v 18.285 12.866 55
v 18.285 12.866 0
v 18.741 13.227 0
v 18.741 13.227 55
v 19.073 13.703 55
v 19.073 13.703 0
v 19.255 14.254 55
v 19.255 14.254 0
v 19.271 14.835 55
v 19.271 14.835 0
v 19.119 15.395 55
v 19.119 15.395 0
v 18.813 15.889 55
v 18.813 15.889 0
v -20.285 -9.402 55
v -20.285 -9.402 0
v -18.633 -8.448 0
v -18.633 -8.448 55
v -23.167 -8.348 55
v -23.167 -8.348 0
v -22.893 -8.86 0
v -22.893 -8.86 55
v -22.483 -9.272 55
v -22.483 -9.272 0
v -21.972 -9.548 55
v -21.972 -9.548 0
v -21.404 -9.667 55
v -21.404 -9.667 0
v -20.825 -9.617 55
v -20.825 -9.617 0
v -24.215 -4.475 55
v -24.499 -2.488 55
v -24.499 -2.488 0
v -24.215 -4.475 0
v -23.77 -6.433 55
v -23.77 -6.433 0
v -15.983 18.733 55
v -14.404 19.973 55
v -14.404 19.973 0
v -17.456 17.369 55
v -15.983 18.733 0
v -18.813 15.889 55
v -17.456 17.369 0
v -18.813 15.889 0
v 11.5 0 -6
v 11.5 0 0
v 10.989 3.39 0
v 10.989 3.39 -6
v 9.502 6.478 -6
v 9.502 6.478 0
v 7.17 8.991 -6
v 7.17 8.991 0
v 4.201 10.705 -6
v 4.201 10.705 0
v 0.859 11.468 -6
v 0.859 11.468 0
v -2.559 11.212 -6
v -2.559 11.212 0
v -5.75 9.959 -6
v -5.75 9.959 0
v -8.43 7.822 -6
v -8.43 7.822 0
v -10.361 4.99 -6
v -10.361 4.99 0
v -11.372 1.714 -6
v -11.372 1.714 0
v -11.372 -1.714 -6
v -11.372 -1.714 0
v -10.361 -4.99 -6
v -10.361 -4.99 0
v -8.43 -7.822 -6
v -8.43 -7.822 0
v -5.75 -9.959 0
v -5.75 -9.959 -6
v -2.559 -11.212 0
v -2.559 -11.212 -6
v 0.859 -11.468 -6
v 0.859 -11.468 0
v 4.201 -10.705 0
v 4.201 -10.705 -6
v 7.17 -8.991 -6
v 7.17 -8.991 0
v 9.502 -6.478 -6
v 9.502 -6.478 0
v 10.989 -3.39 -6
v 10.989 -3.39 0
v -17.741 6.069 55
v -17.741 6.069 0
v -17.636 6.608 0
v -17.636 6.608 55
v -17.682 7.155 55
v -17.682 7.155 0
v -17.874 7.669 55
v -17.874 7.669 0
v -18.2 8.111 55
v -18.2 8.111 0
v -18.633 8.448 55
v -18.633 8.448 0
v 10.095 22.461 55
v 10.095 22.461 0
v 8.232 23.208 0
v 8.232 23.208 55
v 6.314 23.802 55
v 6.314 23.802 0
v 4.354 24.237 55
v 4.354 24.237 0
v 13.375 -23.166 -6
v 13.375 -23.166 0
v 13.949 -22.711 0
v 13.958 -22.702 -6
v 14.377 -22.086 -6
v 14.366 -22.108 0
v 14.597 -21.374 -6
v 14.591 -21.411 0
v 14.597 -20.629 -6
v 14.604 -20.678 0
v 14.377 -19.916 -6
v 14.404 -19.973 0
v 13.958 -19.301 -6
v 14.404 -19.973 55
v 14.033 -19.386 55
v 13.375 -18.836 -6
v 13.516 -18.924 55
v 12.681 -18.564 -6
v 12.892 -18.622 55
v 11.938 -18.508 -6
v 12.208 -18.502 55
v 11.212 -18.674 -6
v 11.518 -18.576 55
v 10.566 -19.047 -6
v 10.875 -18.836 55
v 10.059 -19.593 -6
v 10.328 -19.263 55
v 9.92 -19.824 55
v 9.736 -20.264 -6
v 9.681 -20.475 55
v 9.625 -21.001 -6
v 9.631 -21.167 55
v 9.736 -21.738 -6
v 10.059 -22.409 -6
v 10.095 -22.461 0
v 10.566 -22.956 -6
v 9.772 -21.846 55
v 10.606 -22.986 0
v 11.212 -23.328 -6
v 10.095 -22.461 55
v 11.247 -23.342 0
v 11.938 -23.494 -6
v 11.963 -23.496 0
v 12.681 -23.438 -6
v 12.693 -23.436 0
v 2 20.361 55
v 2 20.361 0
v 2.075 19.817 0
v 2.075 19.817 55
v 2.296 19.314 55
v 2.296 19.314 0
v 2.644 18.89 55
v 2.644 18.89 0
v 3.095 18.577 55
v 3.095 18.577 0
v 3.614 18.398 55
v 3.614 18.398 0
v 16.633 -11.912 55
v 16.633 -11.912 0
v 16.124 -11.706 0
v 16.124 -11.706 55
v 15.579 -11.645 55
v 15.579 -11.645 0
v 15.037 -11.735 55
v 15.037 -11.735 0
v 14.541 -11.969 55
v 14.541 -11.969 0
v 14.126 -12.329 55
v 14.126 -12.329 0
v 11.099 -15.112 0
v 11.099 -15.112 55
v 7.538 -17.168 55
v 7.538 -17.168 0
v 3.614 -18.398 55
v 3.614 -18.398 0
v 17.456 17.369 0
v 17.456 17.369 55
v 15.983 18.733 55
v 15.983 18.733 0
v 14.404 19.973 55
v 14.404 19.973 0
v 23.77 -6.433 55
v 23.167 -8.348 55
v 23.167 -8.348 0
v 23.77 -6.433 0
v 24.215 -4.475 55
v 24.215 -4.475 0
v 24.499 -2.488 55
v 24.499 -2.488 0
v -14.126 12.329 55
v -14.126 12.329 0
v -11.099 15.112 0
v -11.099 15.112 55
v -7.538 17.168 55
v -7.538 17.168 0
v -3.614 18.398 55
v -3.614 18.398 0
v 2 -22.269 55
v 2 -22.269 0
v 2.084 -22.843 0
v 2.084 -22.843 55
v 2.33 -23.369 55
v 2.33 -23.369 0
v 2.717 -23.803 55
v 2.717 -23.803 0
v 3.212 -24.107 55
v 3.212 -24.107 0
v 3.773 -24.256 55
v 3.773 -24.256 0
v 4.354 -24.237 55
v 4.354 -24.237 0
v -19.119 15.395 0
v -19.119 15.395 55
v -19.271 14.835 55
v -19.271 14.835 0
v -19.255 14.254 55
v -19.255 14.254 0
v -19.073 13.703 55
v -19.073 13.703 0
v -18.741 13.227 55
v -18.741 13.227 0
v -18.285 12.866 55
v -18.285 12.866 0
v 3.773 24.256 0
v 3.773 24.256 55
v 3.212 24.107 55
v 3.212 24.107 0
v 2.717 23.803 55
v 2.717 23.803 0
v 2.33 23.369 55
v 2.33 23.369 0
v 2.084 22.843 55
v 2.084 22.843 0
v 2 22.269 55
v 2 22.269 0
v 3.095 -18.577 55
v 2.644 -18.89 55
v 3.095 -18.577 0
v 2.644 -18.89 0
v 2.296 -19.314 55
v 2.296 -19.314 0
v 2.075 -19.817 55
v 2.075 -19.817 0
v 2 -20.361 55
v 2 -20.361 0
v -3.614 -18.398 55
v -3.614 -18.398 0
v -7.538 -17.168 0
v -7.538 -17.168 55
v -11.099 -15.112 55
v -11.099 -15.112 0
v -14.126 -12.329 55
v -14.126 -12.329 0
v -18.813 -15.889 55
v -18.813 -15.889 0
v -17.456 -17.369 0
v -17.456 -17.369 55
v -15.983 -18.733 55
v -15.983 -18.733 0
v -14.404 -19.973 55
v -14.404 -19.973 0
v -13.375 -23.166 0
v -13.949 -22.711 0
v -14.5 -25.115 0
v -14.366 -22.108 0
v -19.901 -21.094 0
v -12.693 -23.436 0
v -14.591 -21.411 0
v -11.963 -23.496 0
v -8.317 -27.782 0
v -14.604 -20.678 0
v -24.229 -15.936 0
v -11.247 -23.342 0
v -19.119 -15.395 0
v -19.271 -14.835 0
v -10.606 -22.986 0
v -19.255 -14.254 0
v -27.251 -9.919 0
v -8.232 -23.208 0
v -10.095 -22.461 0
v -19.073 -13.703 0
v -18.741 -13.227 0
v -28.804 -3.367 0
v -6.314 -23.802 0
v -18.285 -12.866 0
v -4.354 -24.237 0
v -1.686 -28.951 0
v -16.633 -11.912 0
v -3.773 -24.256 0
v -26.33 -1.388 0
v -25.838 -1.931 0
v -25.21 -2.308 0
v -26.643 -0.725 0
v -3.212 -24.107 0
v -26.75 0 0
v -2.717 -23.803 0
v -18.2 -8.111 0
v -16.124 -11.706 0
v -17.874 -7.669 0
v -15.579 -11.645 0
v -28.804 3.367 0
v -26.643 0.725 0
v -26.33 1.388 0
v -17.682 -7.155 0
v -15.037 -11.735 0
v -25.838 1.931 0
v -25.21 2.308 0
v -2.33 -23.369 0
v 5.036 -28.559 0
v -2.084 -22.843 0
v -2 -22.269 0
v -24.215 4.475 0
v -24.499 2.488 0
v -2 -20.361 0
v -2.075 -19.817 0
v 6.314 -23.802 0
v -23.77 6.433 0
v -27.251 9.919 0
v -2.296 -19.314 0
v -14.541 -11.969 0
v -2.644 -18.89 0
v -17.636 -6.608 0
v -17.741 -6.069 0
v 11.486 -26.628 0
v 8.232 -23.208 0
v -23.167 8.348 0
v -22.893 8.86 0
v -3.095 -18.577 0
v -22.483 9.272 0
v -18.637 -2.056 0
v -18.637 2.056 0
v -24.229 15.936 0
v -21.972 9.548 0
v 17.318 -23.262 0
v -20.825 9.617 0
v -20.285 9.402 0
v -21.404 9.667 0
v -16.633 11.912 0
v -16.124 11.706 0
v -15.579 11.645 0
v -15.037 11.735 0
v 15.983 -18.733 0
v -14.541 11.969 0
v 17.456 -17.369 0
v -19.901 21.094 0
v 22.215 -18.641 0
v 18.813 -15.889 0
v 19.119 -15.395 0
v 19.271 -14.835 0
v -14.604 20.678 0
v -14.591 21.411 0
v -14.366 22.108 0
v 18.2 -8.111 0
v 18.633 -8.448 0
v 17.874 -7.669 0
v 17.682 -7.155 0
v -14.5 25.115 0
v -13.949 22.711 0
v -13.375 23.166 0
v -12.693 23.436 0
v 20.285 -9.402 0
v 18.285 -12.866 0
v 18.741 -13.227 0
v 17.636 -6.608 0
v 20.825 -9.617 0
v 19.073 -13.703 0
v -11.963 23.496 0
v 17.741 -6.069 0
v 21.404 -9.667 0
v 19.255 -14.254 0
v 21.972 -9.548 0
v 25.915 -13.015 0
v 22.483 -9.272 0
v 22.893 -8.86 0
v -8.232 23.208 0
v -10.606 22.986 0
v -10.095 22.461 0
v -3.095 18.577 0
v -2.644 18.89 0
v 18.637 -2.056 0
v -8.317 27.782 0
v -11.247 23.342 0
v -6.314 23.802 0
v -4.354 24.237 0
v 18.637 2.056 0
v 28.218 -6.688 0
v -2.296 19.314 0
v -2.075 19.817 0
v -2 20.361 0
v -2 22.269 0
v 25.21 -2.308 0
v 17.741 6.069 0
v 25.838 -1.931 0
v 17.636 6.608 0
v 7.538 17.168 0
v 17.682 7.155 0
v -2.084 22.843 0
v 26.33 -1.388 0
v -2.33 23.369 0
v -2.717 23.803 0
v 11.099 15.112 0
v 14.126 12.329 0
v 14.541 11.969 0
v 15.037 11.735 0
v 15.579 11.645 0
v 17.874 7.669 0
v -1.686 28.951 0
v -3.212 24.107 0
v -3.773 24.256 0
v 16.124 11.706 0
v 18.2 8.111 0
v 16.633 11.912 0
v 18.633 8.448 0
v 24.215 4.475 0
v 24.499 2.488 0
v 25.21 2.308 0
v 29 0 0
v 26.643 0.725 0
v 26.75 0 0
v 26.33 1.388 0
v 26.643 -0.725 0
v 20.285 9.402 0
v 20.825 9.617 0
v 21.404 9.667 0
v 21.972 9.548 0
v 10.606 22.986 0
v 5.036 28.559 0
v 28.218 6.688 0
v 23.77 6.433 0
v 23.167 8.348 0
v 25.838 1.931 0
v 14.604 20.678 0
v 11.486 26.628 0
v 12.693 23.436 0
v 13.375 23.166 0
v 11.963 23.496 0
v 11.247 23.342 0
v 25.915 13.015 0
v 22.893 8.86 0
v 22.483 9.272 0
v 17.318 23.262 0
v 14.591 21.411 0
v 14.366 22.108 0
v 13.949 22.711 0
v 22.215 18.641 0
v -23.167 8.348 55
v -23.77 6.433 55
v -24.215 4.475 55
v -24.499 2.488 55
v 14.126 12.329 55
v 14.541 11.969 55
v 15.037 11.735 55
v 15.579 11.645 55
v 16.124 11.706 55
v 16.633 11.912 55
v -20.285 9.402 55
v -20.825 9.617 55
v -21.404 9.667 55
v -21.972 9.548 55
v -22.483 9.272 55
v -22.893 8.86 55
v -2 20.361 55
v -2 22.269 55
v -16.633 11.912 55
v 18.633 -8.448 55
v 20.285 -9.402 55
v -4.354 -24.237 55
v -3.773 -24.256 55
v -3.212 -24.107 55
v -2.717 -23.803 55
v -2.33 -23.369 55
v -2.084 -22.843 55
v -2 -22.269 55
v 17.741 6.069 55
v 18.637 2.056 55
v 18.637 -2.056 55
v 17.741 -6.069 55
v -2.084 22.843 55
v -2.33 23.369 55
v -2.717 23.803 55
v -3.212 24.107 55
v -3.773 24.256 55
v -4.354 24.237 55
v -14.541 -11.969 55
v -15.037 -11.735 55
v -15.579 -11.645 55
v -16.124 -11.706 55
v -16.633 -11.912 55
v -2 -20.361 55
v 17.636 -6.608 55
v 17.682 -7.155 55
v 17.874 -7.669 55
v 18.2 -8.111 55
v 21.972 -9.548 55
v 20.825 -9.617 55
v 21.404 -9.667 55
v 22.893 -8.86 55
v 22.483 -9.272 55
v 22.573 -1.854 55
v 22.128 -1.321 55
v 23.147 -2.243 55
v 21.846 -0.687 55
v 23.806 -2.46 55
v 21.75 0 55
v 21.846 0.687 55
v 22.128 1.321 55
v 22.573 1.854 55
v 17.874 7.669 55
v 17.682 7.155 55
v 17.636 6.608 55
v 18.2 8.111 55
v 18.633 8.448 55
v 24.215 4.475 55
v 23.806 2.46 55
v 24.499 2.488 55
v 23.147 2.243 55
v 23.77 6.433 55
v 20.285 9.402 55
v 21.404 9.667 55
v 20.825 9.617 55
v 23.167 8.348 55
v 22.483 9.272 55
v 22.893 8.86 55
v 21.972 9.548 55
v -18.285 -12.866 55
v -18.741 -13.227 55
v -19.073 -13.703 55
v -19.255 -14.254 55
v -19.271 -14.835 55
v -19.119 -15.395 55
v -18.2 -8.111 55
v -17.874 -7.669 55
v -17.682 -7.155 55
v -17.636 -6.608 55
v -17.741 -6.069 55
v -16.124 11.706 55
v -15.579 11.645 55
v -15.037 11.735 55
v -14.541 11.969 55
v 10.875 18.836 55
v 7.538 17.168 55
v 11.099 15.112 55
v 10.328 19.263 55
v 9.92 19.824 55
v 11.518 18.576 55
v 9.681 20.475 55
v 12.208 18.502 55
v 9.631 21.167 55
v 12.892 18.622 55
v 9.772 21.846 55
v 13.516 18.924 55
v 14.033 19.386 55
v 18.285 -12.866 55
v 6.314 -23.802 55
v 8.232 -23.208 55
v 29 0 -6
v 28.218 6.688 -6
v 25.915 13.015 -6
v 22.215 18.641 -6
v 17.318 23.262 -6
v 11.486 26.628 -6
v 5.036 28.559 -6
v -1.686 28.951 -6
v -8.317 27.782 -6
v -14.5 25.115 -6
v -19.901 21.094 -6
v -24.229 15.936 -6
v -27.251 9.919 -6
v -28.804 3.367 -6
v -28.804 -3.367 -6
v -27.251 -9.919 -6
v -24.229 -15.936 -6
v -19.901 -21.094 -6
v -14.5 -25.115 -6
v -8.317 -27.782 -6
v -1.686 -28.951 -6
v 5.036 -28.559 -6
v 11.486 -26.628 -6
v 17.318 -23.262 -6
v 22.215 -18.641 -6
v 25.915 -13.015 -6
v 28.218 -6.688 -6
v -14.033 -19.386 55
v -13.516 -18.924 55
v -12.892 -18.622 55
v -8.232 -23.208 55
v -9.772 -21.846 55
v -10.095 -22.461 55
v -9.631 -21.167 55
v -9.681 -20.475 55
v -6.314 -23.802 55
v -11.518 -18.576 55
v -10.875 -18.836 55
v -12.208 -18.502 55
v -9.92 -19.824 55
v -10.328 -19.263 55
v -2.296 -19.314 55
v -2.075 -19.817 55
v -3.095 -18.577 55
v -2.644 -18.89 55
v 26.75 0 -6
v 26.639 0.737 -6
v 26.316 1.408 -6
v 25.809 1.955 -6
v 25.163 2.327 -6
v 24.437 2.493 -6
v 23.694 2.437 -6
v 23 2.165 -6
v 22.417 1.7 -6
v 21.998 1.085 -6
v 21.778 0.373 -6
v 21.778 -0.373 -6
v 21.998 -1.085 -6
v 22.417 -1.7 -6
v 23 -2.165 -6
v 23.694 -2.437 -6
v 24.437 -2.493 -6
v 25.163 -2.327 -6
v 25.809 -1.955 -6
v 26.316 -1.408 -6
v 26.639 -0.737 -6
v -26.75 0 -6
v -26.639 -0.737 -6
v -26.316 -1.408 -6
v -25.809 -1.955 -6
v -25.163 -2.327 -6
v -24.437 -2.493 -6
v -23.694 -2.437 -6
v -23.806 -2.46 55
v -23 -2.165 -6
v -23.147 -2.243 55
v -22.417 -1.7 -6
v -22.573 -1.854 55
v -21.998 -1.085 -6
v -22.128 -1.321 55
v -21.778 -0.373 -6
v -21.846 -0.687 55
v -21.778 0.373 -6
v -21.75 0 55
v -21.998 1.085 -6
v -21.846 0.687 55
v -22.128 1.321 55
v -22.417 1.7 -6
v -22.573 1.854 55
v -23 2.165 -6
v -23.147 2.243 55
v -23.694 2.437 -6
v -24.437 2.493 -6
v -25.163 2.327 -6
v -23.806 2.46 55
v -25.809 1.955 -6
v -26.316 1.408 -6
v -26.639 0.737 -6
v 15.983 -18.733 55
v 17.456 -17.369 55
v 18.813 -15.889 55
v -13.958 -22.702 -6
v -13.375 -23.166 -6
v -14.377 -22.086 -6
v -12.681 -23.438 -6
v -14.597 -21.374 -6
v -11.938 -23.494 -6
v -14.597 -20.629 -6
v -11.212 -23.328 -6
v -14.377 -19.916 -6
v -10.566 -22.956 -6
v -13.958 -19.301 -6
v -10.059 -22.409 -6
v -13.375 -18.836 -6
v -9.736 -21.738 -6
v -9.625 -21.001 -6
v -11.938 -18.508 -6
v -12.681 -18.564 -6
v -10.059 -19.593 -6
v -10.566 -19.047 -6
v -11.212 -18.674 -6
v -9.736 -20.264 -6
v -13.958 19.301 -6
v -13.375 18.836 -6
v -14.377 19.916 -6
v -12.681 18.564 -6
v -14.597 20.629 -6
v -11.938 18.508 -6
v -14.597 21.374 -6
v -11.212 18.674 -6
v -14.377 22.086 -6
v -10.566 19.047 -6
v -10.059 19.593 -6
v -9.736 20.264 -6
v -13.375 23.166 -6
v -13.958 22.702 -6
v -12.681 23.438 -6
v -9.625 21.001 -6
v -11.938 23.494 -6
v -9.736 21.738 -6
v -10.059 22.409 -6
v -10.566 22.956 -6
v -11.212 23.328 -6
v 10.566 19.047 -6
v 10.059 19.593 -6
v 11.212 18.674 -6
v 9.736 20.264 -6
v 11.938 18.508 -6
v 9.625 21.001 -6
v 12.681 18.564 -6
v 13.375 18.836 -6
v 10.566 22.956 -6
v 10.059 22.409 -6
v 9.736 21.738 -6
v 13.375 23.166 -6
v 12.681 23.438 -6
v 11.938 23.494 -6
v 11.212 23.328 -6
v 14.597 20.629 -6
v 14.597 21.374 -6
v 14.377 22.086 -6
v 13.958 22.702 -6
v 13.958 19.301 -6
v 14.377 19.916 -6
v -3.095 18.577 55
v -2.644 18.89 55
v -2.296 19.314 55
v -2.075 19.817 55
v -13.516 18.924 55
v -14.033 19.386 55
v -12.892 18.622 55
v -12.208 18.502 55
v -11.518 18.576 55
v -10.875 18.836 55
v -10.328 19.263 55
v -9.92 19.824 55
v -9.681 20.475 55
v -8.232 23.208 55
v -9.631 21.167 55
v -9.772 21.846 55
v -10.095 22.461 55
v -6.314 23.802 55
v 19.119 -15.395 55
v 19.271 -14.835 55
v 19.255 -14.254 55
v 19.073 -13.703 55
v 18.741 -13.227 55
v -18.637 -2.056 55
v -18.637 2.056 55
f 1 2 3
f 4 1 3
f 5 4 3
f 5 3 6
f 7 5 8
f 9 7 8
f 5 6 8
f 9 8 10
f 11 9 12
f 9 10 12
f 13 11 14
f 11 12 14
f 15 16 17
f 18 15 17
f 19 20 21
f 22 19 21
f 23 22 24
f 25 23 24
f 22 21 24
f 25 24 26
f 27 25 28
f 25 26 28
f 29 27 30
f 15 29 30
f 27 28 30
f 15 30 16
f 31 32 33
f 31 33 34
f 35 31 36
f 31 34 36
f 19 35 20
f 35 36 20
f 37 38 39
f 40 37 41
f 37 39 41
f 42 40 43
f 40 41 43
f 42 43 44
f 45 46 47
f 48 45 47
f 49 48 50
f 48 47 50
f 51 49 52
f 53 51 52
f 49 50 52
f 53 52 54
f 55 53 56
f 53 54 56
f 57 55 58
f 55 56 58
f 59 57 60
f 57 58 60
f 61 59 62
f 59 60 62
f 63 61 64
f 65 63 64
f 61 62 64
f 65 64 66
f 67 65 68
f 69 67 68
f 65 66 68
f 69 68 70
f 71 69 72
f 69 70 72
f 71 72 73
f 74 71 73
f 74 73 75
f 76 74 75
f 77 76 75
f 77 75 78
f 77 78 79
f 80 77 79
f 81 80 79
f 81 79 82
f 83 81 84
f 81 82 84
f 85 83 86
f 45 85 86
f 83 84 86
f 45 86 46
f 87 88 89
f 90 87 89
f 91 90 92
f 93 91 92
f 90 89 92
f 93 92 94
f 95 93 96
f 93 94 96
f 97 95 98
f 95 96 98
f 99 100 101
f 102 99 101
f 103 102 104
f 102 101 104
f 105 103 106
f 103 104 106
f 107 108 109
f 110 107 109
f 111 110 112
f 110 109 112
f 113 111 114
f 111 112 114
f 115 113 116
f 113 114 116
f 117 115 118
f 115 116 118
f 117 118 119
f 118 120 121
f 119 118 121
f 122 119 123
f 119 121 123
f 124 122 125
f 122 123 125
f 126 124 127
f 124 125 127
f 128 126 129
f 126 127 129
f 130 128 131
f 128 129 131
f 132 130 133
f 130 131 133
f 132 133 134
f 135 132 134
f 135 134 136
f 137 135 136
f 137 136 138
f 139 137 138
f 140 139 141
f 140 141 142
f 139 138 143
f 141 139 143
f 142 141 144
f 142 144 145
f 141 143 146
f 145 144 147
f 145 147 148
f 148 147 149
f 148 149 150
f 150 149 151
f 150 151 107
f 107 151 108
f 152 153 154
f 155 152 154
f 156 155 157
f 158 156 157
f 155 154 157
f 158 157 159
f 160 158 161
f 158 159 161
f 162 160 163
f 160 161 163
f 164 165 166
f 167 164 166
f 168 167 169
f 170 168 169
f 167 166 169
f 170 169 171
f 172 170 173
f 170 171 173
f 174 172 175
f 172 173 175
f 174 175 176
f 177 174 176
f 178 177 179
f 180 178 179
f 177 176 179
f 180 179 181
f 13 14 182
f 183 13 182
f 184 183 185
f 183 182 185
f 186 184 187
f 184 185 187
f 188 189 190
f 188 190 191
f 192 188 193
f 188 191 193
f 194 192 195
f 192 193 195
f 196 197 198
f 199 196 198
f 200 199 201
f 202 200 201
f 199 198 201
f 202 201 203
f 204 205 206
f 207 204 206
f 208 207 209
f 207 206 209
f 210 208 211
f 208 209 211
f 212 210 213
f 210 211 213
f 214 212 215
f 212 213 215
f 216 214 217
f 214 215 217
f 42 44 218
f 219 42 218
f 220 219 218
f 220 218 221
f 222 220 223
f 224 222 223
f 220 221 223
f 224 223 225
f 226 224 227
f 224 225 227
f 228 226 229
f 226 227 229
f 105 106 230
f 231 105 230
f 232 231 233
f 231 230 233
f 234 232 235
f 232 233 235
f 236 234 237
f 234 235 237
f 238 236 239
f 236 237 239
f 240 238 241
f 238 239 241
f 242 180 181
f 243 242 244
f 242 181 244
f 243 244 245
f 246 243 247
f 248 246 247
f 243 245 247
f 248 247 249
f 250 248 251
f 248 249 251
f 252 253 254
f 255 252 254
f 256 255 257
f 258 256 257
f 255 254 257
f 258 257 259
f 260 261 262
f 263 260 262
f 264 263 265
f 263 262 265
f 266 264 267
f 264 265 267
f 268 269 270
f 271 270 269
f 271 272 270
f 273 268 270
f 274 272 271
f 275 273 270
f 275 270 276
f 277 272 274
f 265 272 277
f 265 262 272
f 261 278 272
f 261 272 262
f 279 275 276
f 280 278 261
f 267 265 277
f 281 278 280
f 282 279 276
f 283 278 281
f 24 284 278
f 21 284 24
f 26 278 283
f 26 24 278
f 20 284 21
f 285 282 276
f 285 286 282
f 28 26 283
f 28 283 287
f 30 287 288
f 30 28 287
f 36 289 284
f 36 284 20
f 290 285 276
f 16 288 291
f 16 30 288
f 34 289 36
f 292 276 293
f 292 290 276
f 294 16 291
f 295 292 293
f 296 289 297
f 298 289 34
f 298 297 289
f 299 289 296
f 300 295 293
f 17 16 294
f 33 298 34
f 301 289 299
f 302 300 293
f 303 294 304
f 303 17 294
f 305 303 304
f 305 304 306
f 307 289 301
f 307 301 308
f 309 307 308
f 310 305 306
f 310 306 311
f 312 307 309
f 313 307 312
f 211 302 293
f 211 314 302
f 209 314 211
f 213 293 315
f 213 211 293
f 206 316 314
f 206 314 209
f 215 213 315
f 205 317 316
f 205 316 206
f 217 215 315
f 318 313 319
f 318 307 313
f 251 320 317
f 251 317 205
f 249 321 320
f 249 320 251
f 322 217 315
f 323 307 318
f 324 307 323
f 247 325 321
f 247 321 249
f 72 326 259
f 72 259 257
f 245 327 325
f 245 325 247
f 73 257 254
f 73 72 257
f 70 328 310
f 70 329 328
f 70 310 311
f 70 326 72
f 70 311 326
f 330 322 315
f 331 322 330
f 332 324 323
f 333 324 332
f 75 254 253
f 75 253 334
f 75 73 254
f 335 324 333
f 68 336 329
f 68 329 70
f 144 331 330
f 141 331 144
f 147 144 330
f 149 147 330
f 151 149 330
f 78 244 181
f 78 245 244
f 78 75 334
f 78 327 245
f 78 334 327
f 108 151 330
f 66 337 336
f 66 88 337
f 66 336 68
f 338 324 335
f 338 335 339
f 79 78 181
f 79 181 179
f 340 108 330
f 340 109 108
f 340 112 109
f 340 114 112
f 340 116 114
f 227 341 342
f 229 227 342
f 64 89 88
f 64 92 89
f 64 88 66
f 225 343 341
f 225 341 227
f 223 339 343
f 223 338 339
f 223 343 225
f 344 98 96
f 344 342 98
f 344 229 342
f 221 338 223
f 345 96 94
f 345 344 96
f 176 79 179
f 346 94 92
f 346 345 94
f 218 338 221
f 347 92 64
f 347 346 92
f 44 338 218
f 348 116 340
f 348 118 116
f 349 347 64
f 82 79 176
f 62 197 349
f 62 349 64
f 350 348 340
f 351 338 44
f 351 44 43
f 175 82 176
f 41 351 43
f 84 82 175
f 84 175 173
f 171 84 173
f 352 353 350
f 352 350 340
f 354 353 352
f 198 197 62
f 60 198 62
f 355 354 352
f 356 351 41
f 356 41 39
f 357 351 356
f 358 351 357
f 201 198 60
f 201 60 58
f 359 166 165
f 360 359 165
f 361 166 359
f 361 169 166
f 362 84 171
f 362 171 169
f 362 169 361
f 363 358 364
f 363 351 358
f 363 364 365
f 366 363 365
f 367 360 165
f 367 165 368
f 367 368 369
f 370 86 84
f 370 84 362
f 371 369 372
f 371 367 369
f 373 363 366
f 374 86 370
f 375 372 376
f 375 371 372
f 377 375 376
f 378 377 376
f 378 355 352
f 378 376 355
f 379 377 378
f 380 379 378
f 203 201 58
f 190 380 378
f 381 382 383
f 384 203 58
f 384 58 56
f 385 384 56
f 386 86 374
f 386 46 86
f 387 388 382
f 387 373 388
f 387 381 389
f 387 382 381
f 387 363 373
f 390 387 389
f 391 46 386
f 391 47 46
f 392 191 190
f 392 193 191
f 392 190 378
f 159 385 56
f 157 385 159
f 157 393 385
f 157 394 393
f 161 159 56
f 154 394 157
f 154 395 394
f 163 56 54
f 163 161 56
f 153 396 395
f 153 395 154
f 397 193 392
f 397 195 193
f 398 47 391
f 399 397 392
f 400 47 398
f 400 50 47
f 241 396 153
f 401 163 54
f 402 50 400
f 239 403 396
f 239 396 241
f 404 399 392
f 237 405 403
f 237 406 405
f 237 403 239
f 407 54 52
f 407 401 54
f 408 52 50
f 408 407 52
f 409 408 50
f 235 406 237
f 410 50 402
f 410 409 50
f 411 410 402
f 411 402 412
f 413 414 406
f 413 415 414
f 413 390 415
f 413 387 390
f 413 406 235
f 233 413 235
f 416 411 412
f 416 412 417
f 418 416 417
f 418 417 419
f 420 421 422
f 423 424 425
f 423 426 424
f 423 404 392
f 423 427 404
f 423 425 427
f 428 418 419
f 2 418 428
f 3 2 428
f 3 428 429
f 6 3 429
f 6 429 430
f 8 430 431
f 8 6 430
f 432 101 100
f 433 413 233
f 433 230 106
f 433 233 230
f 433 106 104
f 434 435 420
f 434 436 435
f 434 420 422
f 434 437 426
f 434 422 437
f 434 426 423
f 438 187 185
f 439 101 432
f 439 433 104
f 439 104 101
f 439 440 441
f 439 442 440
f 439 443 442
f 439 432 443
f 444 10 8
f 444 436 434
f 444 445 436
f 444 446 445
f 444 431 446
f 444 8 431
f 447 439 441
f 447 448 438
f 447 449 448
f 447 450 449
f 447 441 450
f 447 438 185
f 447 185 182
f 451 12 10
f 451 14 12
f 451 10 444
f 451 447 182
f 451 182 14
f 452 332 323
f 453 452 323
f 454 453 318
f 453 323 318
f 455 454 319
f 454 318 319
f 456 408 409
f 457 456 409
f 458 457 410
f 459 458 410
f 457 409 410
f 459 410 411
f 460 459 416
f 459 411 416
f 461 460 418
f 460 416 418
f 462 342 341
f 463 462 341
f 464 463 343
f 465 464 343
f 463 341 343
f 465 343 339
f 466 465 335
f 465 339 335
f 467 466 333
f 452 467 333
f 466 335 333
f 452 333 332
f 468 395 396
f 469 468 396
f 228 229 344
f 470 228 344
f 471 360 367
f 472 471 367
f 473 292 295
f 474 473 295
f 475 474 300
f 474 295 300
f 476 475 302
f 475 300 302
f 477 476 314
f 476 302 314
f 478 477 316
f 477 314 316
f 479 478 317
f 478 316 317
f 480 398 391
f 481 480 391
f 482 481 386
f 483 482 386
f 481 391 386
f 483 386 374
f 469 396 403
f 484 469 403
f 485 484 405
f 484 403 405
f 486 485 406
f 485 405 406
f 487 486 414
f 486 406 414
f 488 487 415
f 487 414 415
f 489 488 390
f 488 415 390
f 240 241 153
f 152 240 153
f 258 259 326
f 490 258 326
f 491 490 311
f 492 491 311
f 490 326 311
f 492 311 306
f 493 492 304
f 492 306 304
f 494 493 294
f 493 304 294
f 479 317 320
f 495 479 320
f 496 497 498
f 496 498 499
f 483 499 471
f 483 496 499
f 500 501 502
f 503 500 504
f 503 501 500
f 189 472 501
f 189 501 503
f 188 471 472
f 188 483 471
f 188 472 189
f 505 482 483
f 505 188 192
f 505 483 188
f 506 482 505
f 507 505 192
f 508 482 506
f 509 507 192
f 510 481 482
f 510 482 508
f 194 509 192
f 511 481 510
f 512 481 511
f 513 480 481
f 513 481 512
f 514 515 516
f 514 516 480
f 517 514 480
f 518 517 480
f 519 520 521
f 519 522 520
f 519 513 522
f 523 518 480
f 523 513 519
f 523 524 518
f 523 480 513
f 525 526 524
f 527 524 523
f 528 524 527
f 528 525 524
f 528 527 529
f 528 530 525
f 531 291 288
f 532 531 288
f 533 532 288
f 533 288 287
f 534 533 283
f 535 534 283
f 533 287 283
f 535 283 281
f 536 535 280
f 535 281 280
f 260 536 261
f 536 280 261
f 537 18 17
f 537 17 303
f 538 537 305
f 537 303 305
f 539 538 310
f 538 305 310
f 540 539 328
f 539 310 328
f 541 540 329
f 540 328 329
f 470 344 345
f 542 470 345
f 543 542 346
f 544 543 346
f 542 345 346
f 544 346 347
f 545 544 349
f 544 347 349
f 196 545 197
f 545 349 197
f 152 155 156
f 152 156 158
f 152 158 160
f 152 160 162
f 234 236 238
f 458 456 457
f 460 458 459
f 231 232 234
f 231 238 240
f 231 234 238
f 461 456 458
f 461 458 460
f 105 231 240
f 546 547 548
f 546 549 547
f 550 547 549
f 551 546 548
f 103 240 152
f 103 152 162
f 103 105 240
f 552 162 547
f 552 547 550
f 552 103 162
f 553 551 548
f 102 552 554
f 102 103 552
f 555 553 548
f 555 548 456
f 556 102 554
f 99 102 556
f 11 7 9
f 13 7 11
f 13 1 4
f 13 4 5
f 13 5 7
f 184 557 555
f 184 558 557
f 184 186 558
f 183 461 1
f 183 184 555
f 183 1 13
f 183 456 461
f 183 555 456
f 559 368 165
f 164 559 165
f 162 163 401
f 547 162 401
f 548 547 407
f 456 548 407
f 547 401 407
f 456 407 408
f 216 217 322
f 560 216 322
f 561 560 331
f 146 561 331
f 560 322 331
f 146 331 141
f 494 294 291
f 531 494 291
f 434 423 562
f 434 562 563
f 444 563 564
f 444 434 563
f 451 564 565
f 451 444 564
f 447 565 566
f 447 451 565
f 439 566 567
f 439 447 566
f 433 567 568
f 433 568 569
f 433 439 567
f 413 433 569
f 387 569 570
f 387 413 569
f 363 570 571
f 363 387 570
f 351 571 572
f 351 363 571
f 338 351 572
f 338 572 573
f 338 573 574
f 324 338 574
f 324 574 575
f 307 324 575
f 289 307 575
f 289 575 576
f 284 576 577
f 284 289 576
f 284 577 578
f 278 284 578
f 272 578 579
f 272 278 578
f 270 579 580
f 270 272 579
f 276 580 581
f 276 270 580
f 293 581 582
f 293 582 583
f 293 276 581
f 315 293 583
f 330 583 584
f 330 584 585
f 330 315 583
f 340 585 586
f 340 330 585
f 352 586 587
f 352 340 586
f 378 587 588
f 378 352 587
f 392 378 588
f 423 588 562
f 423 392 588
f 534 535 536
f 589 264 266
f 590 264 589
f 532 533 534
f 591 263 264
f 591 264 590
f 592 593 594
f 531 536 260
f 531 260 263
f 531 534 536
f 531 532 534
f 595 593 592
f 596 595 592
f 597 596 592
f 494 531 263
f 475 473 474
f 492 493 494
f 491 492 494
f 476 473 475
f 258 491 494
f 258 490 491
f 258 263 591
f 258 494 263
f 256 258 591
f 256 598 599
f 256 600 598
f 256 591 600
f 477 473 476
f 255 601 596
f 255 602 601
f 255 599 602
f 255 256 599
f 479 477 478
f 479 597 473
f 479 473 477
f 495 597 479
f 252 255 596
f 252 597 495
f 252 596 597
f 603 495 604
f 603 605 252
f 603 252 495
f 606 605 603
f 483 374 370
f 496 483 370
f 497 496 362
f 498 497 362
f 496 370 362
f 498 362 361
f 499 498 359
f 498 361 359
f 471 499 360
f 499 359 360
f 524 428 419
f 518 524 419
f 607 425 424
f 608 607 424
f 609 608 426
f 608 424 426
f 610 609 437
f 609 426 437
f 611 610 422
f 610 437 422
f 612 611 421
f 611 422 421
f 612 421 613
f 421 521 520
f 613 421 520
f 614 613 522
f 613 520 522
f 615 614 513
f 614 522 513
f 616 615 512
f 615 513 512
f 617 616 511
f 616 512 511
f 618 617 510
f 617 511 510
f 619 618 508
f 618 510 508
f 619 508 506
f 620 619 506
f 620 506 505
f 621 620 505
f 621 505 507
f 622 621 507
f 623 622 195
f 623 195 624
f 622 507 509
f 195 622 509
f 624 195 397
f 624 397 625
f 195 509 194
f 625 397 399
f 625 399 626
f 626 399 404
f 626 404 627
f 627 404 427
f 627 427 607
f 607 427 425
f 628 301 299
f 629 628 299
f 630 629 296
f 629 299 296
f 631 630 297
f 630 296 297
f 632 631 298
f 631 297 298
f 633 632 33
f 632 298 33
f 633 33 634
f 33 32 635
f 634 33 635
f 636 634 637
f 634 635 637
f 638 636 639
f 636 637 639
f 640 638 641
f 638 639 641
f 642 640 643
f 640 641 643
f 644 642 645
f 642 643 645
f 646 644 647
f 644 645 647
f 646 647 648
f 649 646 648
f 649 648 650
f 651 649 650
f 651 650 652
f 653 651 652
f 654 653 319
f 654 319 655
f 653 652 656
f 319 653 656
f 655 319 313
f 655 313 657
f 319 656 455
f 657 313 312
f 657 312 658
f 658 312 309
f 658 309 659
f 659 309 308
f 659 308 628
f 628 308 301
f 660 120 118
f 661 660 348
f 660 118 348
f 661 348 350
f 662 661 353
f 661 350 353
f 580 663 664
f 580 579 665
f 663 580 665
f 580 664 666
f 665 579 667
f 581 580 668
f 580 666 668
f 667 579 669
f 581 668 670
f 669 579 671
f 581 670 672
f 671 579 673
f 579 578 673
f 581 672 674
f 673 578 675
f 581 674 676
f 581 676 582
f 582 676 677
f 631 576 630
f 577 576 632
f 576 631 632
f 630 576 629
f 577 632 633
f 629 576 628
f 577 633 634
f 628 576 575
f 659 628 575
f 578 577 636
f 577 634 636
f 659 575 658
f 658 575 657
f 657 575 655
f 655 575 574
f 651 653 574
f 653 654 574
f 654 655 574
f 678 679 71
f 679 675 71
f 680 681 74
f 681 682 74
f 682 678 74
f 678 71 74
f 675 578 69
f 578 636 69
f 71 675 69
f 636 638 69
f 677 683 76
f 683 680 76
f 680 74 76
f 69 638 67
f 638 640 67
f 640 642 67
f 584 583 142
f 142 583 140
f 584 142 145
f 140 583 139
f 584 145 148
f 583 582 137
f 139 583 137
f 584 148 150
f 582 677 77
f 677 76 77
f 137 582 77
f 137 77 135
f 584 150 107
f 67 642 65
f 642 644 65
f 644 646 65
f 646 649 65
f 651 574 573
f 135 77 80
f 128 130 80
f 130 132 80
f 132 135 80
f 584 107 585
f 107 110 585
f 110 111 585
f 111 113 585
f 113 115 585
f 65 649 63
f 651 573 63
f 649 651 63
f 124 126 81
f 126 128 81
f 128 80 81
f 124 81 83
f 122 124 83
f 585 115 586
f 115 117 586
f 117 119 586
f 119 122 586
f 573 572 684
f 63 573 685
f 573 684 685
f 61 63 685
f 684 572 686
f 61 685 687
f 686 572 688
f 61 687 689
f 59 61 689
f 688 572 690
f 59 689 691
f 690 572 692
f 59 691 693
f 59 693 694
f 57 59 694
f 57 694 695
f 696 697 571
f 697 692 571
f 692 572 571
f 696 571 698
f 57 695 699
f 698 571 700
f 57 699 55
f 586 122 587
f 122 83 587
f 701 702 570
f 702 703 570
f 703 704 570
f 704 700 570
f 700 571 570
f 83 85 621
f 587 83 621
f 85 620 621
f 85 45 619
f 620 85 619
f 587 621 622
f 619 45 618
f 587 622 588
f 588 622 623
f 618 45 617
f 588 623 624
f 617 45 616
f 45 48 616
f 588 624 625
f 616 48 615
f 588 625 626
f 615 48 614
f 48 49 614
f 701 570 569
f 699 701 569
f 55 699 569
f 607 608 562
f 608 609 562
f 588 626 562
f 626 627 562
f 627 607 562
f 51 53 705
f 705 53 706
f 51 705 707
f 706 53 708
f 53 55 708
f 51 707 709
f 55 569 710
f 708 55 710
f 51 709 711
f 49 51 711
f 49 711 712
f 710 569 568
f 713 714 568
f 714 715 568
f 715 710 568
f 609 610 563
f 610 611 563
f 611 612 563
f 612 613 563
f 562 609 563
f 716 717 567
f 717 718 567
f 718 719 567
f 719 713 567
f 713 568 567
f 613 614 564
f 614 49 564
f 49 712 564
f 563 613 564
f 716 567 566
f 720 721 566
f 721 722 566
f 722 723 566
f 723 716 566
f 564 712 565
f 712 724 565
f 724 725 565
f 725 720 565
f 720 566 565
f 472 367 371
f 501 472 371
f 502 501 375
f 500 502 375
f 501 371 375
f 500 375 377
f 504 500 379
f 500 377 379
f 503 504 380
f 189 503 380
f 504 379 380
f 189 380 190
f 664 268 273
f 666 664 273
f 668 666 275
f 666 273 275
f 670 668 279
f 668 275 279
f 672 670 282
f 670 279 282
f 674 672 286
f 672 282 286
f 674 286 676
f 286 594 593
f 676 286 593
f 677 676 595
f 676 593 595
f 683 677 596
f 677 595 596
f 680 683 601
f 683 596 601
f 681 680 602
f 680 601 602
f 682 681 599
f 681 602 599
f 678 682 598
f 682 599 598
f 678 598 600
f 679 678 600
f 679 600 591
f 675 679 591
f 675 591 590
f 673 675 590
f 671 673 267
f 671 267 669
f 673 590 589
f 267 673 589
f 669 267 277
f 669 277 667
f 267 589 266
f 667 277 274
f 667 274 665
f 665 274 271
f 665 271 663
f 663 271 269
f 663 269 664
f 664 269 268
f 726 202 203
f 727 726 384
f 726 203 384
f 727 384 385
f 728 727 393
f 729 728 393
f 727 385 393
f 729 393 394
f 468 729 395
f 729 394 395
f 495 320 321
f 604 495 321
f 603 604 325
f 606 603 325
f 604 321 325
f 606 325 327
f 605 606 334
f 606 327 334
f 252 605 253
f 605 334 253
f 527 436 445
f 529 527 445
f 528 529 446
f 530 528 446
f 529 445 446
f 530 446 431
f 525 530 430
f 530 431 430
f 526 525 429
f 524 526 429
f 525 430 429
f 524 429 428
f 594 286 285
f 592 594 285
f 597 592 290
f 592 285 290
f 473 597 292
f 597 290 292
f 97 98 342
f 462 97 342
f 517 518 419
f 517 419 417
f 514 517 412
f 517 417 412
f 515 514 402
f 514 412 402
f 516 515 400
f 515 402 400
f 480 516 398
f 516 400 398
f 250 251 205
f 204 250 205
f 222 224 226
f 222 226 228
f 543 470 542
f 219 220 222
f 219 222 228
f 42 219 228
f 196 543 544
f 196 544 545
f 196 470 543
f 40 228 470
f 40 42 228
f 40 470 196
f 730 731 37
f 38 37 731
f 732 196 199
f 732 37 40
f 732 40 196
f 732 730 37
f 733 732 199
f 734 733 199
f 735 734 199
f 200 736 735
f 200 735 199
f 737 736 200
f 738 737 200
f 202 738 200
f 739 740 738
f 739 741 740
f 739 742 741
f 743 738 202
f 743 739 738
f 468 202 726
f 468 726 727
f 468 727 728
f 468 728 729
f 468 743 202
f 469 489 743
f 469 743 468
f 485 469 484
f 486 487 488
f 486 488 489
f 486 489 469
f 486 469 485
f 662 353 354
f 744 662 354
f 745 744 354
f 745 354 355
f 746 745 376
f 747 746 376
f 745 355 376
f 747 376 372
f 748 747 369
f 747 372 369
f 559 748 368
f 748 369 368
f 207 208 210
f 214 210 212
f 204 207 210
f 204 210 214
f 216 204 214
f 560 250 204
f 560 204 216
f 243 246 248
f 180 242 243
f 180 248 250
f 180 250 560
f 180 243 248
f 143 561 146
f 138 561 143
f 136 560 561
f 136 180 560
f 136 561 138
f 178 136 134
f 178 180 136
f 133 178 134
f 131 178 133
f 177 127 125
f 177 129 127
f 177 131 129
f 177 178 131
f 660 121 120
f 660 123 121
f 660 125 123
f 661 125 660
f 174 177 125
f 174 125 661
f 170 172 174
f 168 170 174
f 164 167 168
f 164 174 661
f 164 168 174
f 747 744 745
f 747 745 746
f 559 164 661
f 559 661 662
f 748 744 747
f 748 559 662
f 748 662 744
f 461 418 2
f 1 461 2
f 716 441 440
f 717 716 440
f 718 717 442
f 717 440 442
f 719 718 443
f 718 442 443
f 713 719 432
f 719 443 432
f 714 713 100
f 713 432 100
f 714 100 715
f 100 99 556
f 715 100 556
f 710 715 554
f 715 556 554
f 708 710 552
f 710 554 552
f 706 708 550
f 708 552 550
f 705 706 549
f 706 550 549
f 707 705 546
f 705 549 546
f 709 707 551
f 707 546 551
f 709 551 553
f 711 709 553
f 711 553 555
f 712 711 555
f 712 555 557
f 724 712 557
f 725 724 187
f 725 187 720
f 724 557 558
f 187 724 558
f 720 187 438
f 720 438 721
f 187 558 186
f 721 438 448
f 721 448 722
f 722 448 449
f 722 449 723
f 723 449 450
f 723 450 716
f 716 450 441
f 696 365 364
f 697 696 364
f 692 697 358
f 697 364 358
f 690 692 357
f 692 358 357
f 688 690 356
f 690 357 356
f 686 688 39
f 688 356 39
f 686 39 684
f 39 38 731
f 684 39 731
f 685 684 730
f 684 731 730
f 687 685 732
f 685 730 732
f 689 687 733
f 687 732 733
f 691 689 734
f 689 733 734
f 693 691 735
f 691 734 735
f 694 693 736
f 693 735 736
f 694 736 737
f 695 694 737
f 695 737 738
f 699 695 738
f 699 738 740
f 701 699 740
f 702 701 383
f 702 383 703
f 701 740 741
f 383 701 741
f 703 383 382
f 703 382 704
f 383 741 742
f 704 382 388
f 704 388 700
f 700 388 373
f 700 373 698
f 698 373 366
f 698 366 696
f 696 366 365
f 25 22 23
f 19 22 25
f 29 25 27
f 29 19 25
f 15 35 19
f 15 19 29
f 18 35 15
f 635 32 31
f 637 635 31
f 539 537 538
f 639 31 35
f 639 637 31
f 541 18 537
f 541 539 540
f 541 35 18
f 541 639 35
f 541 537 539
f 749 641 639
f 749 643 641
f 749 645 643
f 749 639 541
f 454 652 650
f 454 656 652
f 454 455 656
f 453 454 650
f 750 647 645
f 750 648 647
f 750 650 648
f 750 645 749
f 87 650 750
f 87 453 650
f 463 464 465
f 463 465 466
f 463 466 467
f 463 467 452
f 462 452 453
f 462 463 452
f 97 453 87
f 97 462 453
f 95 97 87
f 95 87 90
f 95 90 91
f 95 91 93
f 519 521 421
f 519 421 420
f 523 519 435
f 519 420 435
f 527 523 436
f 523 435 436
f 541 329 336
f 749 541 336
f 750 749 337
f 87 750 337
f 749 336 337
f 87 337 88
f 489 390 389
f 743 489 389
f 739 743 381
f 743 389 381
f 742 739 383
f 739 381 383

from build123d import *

# Parameters (mm, degrees)
F1_DEPTH = 55
F2_R     = 29
F2_R_2   = 11.5
F3_DEPTH = 6
F5_R     = 2.5
F7_DEPTH = 100
F8_COUNT = 6


with BuildPart() as f1:
    # F0 (on Top) → F1 (new body)
    with BuildSketch(Plane.XY):
        with BuildLine():
            Line((-2, -22.2686017747), (-2, -20.3608079407))
            ThreePointArc((-2, -20.3608079407), (-2.4554799552, -19.0901947694), (-3.6144578313, -18.3983204284))
            ThreePointArc((-3.6144578313, -18.3983204284), (-9.375, -16.237976321), (-14.1261839623, -12.329372517))
            ThreePointArc((-14.1261839623, -12.329372517), (-15.3048536558, -11.6716054044), (-16.6329769183, -11.9124547779))
            Line((-16.6329769183, -11.9124547779), (-18.2851748436, -12.8663516949))
            ThreePointArc((-18.2851748436, -12.8663516949), (-19.2553429626, -14.2542548846), (-18.8131461005, -15.888869022))
            ThreePointArc((-18.8131461005, -15.888869022), (-12.3125, -21.3258755682), (-4.3535911602, -24.2370969592))
            ThreePointArc((-4.3535911602, -24.2370969592), (-2.7168753608, -23.8027436065), (-2, -22.2686017747))
        make_face()
    extrude(amount=F1_DEPTH)



with BuildPart() as f1b:
    # F0 (on Top) → F1, piece 2 (new body)
    with BuildSketch(Plane.XY):
        with BuildLine():
            ThreePointArc((14.1261839623, -12.329372517), (9.375, -16.237976321), (3.6144578313, -18.3983204284))
            ThreePointArc((3.6144578313, -18.3983204284), (2.4554799552, -19.0901947694), (2, -20.3608079407))
            Line((2, -20.3608079407), (2, -22.2686017747))
            ThreePointArc((2, -22.2686017747), (2.7168753608, -23.8027436065), (4.3535911602, -24.2370969592))
            ThreePointArc((4.3535911602, -24.2370969592), (12.3125, -21.3258755682), (18.8131461005, -15.888869022))
            ThreePointArc((18.8131461005, -15.888869022), (19.2553429626, -14.2542548846), (18.2851748436, -12.8663516949))
            Line((18.2851748436, -12.8663516949), (16.6329769183, -11.9124547779))
            ThreePointArc((16.6329769183, -11.9124547779), (15.3048536558, -11.6716054044), (14.1261839623, -12.329372517))
        make_face()
    extrude(amount=F1_DEPTH)


with BuildPart() as f1c:
    # F0 (on Top) → F1, piece 3 (new body)
    with BuildSketch(Plane.XY):
        with BuildLine():
            ThreePointArc((17.7406417936, -6.0689479114), (17.7603336111, -7.418589365), (18.6329769183, -8.4483531628))
            Line((18.6329769183, -8.4483531628), (20.2851748436, -9.4022500798))
            ThreePointArc((20.2851748436, -9.4022500798), (21.9722183234, -9.5484887219), (23.1667372608, -8.3482279372))
            ThreePointArc((23.1667372608, -8.3482279372), (24.625, 0), (23.1667372608, 8.3482279372))
            ThreePointArc((23.1667372608, 8.3482279372), (21.9722183234, 9.5484887219), (20.2851748436, 9.4022500798))
            Line((20.2851748436, 9.4022500798), (18.6329769183, 8.4483531628))
            ThreePointArc((18.6329769183, 8.4483531628), (17.7603336111, 7.418589365), (17.7406417936, 6.0689479114))
            ThreePointArc((17.7406417936, 6.0689479114), (18.75, 0), (17.7406417936, -6.0689479114))
        make_face()
    extrude(amount=F1_DEPTH)


with BuildPart() as f1d:
    # F0 (on Top) → F1, piece 4 (new body)
    with BuildSketch(Plane.XY):
        with BuildLine():
            ThreePointArc((-17.7406417936, 6.0689479114), (-17.7603336111, 7.418589365), (-18.6329769183, 8.4483531628))
            Line((-18.6329769183, 8.4483531628), (-20.2851748436, 9.4022500798))
            ThreePointArc((-20.2851748436, 9.4022500798), (-21.9722183234, 9.5484887219), (-23.1667372608, 8.3482279372))
            ThreePointArc((-23.1667372608, 8.3482279372), (-24.625, 0), (-23.1667372608, -8.3482279372))
            ThreePointArc((-23.1667372608, -8.3482279372), (-21.9722183234, -9.5484887219), (-20.2851748436, -9.4022500798))
            Line((-20.2851748436, -9.4022500798), (-18.6329769183, -8.4483531628))
            ThreePointArc((-18.6329769183, -8.4483531628), (-17.7603336111, -7.418589365), (-17.7406417936, -6.0689479114))
            ThreePointArc((-17.7406417936, -6.0689479114), (-18.75, 0), (-17.7406417936, 6.0689479114))
        make_face()
    extrude(amount=F1_DEPTH)


with BuildPart() as f1e:
    # F0 (on Top) → F1, piece 5 (new body)
    with BuildSketch(Plane.XY):
        with BuildLine():
            ThreePointArc((-3.6144578313, 18.3983204284), (-2.4554799552, 19.0901947694), (-2, 20.3608079407))
            Line((-2, 20.3608079407), (-2, 22.2686017747))
            ThreePointArc((-2, 22.2686017747), (-2.7168753608, 23.8027436065), (-4.3535911602, 24.2370969592))
            ThreePointArc((-4.3535911602, 24.2370969592), (-12.3125, 21.3258755682), (-18.8131461005, 15.888869022))
            ThreePointArc((-18.8131461005, 15.888869022), (-19.2553429626, 14.2542548846), (-18.2851748436, 12.8663516949))
            Line((-18.2851748436, 12.8663516949), (-16.6329769183, 11.9124547779))
            ThreePointArc((-16.6329769183, 11.9124547779), (-15.3048536558, 11.6716054044), (-14.1261839623, 12.329372517))
            ThreePointArc((-14.1261839623, 12.329372517), (-9.375, 16.237976321), (-3.6144578313, 18.3983204284))
        make_face()
    extrude(amount=F1_DEPTH)


with BuildPart() as f1f:
    # F0 (on Top) → F1, piece 6 (new body)
    with BuildSketch(Plane.XY):
        with BuildLine():
            ThreePointArc((14.1261839623, 12.329372517), (15.3048536558, 11.6716054044), (16.6329769183, 11.9124547779))
            Line((16.6329769183, 11.9124547779), (18.2851748436, 12.8663516949))
            ThreePointArc((18.2851748436, 12.8663516949), (19.2553429626, 14.2542548846), (18.8131461005, 15.888869022))
            ThreePointArc((18.8131461005, 15.888869022), (12.3125, 21.3258755682), (4.3535911602, 24.2370969592))
            ThreePointArc((4.3535911602, 24.2370969592), (2.7168753608, 23.8027436065), (2, 22.2686017747))
            Line((2, 22.2686017747), (2, 20.3608079407))
            ThreePointArc((2, 20.3608079407), (2.4554799552, 19.0901947694), (3.6144578313, 18.3983204284))
            ThreePointArc((3.6144578313, 18.3983204284), (9.375, 16.237976321), (14.1261839623, 12.329372517))
        make_face()
    extrude(amount=F1_DEPTH)


with BuildPart() as f1_1:
    add(f1.part)

    add(f1b.part)  # F3 merges F1b

    add(f1c.part)  # F3 merges F1c

    add(f1d.part)  # F3 merges F1d

    add(f1e.part)  # F3 merges F1e

    add(f1f.part)  # F3 merges F1f
    # F2 (on Top) → F3 (join)
    with BuildSketch(Plane.XY):
        Circle(F2_R)
        Circle(F2_R_2, mode=Mode.SUBTRACT)
    extrude(amount=-F3_DEPTH)


with BuildPart() as f7:
    # F5 (on offset) → F7 (new body)
    with BuildSketch(Plane.XY.offset(80)):
        with Locations((24.25, 0)):
            Circle(F5_R)
    extrude(amount=-F7_DEPTH)


with BuildPart() as f8_1:
    # F8: instance of F7
    add(f7.part.rotate(Axis((0, 0, 60.7173442841), (0, 0, 1)), 1 * 360 / F8_COUNT))


with BuildPart() as f8_2:
    # F8: instance of F7
    add(f7.part.rotate(Axis((0, 0, 60.7173442841), (0, 0, 1)), 2 * 360 / F8_COUNT))


with BuildPart() as f8_3:
    # F8: instance of F7
    add(f7.part.rotate(Axis((0, 0, 60.7173442841), (0, 0, 1)), 3 * 360 / F8_COUNT))


with BuildPart() as f8_4:
    # F8: instance of F7
    add(f7.part.rotate(Axis((0, 0, 60.7173442841), (0, 0, 1)), 4 * 360 / F8_COUNT))


with BuildPart() as f8_5:
    # F8: instance of F7
    add(f7.part.rotate(Axis((0, 0, 60.7173442841), (0, 0, 1)), 5 * 360 / F8_COUNT))


with BuildPart() as f1_2:
    add(f1_1.part)

    # F9: cut F7, F8_2, F8_3, F8_4, F8_5, F8_1
    add(f7.part, mode=Mode.SUBTRACT)
    add(f8_2.part, mode=Mode.SUBTRACT)
    add(f8_3.part, mode=Mode.SUBTRACT)
    add(f8_4.part, mode=Mode.SUBTRACT)
    add(f8_5.part, mode=Mode.SUBTRACT)
    add(f8_1.part, mode=Mode.SUBTRACT)


solid = f1_2.part
